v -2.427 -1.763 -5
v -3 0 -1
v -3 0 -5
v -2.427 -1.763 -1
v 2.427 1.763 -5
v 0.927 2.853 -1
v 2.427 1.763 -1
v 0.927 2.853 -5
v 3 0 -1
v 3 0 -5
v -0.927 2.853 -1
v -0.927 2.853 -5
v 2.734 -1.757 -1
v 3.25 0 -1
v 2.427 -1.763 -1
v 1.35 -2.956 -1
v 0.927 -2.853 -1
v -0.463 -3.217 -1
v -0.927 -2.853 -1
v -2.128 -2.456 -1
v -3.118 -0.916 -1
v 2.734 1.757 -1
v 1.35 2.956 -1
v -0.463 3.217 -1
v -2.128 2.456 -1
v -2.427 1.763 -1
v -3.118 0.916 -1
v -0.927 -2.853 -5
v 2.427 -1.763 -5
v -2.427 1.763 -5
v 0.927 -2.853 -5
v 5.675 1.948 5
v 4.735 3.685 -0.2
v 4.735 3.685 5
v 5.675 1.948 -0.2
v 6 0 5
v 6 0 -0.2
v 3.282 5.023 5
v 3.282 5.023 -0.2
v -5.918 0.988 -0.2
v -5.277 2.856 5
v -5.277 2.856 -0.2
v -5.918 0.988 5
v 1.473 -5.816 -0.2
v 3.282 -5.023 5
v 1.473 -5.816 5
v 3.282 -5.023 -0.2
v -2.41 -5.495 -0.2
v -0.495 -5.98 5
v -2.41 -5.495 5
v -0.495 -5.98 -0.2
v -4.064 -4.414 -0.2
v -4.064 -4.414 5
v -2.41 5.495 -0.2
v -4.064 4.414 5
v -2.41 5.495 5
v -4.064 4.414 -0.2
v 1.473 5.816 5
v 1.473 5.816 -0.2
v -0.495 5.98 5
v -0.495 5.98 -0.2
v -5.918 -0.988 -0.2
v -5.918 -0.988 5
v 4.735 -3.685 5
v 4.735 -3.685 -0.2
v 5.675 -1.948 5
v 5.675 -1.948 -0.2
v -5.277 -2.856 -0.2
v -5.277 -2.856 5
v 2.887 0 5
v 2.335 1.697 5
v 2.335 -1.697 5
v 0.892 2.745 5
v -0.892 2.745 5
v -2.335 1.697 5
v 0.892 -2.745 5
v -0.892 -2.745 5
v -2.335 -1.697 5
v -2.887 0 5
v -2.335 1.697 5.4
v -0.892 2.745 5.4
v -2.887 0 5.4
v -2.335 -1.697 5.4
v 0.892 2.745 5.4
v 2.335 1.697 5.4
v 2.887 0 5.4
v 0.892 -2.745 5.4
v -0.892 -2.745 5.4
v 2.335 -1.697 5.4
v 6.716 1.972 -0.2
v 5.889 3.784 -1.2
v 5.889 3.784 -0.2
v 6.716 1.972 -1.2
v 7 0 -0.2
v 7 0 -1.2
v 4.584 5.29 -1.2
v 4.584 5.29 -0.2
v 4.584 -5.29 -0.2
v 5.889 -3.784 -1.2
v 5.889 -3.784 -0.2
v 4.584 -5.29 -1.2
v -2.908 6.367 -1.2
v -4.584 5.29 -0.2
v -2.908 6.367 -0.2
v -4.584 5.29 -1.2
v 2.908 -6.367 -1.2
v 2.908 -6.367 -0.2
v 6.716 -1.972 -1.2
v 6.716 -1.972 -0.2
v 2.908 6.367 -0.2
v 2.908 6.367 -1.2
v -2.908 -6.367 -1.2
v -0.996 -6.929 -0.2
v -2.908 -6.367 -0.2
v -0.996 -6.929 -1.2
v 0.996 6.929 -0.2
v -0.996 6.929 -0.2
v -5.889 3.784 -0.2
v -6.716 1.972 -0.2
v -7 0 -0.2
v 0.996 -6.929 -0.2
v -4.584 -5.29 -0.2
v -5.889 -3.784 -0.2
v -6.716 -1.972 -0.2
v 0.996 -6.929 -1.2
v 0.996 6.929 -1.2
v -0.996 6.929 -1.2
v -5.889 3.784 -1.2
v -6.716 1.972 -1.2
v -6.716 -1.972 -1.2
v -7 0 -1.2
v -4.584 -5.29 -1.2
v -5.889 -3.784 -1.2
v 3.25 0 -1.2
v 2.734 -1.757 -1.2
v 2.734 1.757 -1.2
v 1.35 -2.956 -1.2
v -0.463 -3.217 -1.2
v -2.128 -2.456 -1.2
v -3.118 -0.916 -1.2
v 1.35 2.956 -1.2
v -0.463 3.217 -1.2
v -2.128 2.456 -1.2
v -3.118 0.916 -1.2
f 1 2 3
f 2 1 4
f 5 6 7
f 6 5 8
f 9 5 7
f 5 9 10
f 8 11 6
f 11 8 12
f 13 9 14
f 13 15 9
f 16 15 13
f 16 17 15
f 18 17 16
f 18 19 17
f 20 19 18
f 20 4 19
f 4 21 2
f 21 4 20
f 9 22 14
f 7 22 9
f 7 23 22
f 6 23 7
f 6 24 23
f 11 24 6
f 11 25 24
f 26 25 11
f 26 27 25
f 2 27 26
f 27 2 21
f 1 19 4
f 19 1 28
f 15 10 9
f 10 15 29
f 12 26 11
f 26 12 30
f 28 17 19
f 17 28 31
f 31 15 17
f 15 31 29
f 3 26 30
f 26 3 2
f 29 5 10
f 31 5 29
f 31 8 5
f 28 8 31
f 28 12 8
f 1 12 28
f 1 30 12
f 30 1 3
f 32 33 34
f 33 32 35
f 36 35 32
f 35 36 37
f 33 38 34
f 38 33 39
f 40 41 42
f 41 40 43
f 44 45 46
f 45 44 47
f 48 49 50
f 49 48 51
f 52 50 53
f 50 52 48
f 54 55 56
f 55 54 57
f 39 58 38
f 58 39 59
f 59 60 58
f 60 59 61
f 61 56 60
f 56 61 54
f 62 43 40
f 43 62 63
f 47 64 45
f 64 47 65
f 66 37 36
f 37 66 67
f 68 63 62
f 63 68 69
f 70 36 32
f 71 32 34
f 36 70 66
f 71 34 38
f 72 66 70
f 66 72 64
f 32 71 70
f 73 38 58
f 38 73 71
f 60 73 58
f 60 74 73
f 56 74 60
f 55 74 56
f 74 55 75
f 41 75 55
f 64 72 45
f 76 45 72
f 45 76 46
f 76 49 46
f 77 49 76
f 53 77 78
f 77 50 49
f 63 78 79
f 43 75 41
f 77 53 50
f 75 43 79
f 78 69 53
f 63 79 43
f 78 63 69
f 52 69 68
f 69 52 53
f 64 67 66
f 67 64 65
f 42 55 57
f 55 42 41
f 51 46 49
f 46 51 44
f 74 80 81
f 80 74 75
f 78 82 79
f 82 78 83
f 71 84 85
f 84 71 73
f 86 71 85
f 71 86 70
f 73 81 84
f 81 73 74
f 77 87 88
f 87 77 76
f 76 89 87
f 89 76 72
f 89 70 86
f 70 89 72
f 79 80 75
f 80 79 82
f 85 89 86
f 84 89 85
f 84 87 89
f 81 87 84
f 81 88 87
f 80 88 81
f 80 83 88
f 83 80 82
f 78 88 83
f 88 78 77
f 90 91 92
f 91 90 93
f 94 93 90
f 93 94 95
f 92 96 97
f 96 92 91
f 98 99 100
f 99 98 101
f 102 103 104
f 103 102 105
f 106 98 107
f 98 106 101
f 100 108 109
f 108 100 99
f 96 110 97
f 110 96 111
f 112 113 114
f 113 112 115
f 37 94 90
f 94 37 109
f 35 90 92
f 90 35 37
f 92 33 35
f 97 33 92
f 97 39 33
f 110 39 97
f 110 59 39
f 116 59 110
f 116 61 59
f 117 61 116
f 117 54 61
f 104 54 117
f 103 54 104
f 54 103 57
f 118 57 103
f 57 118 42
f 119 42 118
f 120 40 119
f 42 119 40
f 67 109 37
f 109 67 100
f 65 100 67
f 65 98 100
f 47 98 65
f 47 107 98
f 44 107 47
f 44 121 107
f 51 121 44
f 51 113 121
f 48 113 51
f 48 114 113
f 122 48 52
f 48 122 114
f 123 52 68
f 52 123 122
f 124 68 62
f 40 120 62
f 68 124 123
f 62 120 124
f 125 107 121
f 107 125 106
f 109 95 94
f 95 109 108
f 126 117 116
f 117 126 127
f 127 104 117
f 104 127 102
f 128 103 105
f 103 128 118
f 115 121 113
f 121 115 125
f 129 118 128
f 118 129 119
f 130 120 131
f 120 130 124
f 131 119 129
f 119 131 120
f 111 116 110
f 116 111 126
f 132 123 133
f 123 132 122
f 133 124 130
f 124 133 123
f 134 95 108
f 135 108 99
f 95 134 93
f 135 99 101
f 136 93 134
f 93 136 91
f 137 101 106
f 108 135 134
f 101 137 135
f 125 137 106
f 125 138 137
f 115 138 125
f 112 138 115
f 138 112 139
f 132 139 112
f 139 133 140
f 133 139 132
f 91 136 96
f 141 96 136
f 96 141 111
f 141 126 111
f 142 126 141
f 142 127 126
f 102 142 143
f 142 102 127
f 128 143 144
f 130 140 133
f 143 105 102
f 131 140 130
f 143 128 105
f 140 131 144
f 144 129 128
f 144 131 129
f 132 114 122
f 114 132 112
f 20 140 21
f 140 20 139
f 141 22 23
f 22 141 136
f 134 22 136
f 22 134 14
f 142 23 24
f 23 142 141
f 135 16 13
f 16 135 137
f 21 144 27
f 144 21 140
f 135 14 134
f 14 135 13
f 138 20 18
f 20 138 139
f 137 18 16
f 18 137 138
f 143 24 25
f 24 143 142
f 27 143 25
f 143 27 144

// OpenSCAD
// Parameters
shank_diameter_mm = 6.0; //[3.0:12.0:0.1]
head_diameter_mm = 12.0; //[6.0:24.0:0.1]
length_mm = 10.0; //[5.0:30.0:0.5]
head_height_mm = 6.0; //[3.0:12.0:0.1]
socket_hex_af_mm = 5.0; //[2.5:10.0:0.1]
socket_depth_mm = 4.0; //[2.0:8.0:0.1]
thread_pitch_mm = 1.0; //[0.5:2.0:0.05]
thread_length_mm = 7.0; //[3.0:20.0:0.5]
thread_representation = 1; //[0:1:1]
washer_outer_diameter_mm = 14.0; //[8.0:28.0:0.1]
washer_thickness_mm = 1.0; //[0.5:3.0:0.1]
washer_hole_diameter_mm = 6.5; //[6.1:13.0:0.1]
overlap_mm = 0.8; //[0.2:2.0:0.1]
tip_chamfer_height_mm = 1.0; //[0.5:2.5:0.1]
tip_chamfer_reduction_mm = 1.0; //[0.3:2.0:0.1]
head_to_shank_fillet_height_mm = 0.8; //[0.3:2.0:0.1]
thread_groove_depth_mm = 0.25; //[0.1:0.6:0.05]
thread_groove_width_mm = 0.35; //[0.15:0.8:0.05]

// Screw and Washer - Complete Geometry
module screw_and_washer() {
  color("DimGray") {
    // Screw Body
    union() {
      // Shank
      translate([0, 0, -head_height_mm/2])
        cylinder(h=length_mm - head_height_mm, r=shank_diameter_mm/2, center=true);
      
      // Head
      translate([0, 0, length_mm/2 - head_height_mm/2])
        cylinder(h=head_height_mm, r=head_diameter_mm/2, center=true);
      
      // Head to Shank Fillet
      translate([0, 0, length_mm/2 - head_height_mm - head_to_shank_fillet_height_mm/2 + overlap_mm])
        cylinder(h=head_to_shank_fillet_height_mm, r1=head_diameter_mm/2, r2=shank_diameter_mm/2, center=true);
      
      // Tip Chamfer
      translate([0, 0, -length_mm/2 + tip_chamfer_height_mm/2])
        cylinder(h=tip_chamfer_height_mm, r1=shank_diameter_mm/2, r2=shank_diameter_mm/2 - tip_chamfer_reduction_mm, center=true);
    }
    
    // Hex Socket Recess
    difference() {
      translate([0, 0, length_mm/2 - socket_depth_mm/2])
        cylinder(h=socket_depth_mm + overlap_mm, r=socket_hex_af_mm/(2*cos(30)), center=true);
    }
    
    // Cosmetic Thread Representation
    if (thread_representation == 1) {
      difference() {
        translate([0, 0, -length_mm/2 + thread_length_mm/2 + tip_chamfer_height_mm - overlap_mm])
          cylinder(h=thread_length_mm, r=shank_diameter_mm/2 - thread_groove_depth_mm, center=true);
      }
    }
  }
  
  // Washer
  color("Silver") {
    difference() {
      translate([0, 0, length_mm/2 - head_height_mm - washer_thickness_mm/2 + overlap_mm])
        cylinder(h=washer_thickness_mm, r=washer_outer_diameter_mm/2, center=true);
      translate([0, 0, length_mm/2 - head_height_mm - washer_thickness_mm/2 + overlap_mm])
        cylinder(h=washer_thickness_mm + 2*overlap_mm, r=washer_hole_diameter_mm/2, center=true);
    }
  }
}

// Assembly
module assembly() {
  screw_and_washer();
}

assembly();
